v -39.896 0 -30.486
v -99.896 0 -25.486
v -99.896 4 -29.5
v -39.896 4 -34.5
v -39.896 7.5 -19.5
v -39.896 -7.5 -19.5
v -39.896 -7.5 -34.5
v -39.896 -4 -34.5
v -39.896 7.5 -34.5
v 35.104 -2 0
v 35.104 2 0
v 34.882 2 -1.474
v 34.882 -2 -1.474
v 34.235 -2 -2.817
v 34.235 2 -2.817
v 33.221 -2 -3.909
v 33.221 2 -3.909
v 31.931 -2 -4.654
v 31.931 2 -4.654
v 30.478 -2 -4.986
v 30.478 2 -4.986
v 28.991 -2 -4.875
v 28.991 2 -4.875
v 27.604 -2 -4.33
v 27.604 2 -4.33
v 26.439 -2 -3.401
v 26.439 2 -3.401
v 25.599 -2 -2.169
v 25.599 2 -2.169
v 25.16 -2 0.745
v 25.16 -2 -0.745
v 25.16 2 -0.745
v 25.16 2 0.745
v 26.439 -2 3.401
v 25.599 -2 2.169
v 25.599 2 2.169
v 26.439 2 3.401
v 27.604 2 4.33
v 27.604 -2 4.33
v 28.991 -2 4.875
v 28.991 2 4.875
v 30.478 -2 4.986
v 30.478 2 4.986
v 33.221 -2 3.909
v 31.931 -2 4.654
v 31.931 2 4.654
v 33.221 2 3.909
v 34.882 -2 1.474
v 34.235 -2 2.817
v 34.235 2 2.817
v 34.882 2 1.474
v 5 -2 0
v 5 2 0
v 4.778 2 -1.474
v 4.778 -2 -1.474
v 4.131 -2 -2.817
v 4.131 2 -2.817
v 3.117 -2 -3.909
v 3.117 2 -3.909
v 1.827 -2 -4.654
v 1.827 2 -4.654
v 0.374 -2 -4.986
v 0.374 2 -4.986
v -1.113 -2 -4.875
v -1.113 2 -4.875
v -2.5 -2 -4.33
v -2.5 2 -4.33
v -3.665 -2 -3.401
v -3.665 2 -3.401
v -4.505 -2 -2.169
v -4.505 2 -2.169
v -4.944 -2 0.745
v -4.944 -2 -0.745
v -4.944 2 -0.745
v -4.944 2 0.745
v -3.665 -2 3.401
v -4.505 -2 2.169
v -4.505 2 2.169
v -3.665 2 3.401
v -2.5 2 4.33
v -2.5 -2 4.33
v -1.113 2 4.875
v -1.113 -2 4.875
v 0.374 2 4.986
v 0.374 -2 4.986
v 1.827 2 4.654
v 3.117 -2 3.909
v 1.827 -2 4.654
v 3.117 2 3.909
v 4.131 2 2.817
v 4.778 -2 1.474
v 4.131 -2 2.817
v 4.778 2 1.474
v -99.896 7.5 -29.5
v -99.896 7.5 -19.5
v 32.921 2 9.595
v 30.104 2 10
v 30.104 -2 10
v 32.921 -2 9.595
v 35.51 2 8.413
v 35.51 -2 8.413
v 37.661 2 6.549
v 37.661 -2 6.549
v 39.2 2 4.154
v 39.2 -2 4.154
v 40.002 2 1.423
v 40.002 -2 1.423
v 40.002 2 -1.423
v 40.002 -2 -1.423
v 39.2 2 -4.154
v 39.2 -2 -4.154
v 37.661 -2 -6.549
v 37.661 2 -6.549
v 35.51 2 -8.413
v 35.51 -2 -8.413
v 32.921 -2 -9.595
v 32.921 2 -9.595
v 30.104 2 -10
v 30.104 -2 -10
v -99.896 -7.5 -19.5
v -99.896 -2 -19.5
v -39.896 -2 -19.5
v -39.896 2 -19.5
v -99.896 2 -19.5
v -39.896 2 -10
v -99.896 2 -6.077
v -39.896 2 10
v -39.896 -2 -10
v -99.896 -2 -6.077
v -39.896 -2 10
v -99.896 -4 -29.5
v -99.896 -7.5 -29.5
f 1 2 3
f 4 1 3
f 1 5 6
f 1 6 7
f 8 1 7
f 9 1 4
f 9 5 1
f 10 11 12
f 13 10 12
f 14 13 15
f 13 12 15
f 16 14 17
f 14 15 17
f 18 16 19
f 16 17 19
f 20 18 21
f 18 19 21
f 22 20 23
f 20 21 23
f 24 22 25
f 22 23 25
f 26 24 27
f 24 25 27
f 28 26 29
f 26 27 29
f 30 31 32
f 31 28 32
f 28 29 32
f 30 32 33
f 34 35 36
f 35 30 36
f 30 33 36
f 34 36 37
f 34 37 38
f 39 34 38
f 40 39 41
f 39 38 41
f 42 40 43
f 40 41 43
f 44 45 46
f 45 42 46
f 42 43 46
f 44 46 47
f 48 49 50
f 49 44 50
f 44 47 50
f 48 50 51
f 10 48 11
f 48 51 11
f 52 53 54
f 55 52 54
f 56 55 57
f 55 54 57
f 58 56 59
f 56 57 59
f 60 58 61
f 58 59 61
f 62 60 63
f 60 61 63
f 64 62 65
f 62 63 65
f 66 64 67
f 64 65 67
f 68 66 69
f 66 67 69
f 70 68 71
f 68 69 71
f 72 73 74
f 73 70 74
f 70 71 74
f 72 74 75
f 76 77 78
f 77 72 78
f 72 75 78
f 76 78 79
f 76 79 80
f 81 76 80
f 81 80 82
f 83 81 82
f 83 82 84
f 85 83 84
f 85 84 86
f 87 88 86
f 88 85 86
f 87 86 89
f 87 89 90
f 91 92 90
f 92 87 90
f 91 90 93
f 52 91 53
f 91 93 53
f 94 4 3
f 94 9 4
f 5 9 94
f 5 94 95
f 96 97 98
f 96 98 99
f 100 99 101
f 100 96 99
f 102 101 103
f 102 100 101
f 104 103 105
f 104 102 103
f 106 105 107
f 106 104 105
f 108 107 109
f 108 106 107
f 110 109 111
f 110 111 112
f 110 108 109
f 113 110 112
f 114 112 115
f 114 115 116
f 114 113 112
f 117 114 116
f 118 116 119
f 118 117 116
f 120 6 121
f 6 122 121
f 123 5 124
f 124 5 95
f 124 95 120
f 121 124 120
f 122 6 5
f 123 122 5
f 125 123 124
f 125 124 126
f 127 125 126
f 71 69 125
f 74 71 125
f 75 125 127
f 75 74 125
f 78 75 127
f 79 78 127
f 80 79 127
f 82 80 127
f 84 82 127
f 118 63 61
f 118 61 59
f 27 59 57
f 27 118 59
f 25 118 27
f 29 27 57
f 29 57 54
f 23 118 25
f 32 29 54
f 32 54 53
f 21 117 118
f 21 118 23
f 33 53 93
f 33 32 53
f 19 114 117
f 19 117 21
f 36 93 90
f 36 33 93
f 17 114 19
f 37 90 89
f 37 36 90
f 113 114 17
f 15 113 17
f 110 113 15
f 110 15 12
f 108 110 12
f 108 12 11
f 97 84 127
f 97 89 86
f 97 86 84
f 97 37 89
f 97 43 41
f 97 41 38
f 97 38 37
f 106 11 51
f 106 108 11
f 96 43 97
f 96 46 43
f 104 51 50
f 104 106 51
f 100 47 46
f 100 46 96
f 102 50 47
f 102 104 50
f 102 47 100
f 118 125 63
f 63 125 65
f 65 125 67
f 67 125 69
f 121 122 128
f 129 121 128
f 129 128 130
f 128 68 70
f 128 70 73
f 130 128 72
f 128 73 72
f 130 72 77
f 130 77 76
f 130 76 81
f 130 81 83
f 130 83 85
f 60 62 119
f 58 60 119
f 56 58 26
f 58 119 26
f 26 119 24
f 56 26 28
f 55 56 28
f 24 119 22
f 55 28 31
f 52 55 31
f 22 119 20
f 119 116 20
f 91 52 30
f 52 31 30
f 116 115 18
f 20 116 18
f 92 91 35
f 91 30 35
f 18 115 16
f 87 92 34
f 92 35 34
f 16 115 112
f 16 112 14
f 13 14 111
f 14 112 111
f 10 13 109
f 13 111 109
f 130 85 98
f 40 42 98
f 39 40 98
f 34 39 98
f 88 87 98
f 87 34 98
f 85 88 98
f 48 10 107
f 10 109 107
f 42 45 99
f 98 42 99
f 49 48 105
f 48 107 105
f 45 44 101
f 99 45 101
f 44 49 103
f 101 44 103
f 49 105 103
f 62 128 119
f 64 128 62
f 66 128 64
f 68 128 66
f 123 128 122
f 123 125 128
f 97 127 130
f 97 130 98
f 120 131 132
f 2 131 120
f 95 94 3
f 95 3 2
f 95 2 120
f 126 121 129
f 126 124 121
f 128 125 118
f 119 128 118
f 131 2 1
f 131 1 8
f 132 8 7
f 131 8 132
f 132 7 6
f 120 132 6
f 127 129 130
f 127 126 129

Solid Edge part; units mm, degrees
sketch "Sketch1" plane through (0, 0, 0) normal (0, -1, 0) x (1, 0, 0)
  line L0 (-39.896, 10) -> (30.104, 10)
  line L1 (-39.896, -10) -> (30.104, -10)
  line L2 (-39.896, -10) -> (-39.896, -22.5)
  line L3 (-99.896, -22.5) -> (-39.896, -22.5)
  line L4 (-99.896, -10) -> (-99.896, -22.5)
  line L5 (-99.896, -10) -> (-99.896, -6.077)
  line L6 (-99.896, -6.077) -> (-39.896, 10)
  arc A0 (30.104, 10) -> (30.104, -10) centre (30.104, 0) cw
  circle A1 centre (30.104, 0) radius 5
  circle A2 centre (0, 0) radius 5
  dimension "D1" = 10
  dimension "D2" = 30.104
  dimension "D3" = 10
  dimension "D4" = 70
  dimension "D5" = 70
  dimension "D6" = 12.5
  dimension "D7" = 60
  dimension "D8" = 16.423
extrude "Protrusion1" add sketch "Sketch1" along normal mid plane 4
sketch "Sketch2" plane through (-29.896, 0, -6.25) normal (0, -1, 0) x (-0.9659258, 0, -0.258819)
  line L0 (13.0886, 10.2103) -> (16.9709, 24.6992)
  line L1 (16.9709, 24.6992) -> (73.6324, 4.3404)
  line L2 (73.6324, 4.3404) -> (71.0442, -5.3188)
  line L3 (13.0886, 10.2103) -> (71.0442, -5.3188)
extrude "ProtrusiónExtruida_3" add sketch "Sketch2" along normal mid plane 15
sketch "Sketch3" plane through (-69.896, -7.5, -32) normal (-0.9965458, 0, 0.0830455) x (0, -1, 0)
  line L0 (-7.5, 4) -> (-3.5, 0)
  line L1 (-3.5, 0) -> (-11.5, 0)
  line L2 (-7.5, 4) -> (-11.5, 0)
  dimension "D1" = 4
  dimension "D2" = 8
extrude "Cutout1" cut sketch "Sketch3" along normal through all and the other way through all
properties part number "1976-1500-005" material "Aluminio, 7075-T6"
